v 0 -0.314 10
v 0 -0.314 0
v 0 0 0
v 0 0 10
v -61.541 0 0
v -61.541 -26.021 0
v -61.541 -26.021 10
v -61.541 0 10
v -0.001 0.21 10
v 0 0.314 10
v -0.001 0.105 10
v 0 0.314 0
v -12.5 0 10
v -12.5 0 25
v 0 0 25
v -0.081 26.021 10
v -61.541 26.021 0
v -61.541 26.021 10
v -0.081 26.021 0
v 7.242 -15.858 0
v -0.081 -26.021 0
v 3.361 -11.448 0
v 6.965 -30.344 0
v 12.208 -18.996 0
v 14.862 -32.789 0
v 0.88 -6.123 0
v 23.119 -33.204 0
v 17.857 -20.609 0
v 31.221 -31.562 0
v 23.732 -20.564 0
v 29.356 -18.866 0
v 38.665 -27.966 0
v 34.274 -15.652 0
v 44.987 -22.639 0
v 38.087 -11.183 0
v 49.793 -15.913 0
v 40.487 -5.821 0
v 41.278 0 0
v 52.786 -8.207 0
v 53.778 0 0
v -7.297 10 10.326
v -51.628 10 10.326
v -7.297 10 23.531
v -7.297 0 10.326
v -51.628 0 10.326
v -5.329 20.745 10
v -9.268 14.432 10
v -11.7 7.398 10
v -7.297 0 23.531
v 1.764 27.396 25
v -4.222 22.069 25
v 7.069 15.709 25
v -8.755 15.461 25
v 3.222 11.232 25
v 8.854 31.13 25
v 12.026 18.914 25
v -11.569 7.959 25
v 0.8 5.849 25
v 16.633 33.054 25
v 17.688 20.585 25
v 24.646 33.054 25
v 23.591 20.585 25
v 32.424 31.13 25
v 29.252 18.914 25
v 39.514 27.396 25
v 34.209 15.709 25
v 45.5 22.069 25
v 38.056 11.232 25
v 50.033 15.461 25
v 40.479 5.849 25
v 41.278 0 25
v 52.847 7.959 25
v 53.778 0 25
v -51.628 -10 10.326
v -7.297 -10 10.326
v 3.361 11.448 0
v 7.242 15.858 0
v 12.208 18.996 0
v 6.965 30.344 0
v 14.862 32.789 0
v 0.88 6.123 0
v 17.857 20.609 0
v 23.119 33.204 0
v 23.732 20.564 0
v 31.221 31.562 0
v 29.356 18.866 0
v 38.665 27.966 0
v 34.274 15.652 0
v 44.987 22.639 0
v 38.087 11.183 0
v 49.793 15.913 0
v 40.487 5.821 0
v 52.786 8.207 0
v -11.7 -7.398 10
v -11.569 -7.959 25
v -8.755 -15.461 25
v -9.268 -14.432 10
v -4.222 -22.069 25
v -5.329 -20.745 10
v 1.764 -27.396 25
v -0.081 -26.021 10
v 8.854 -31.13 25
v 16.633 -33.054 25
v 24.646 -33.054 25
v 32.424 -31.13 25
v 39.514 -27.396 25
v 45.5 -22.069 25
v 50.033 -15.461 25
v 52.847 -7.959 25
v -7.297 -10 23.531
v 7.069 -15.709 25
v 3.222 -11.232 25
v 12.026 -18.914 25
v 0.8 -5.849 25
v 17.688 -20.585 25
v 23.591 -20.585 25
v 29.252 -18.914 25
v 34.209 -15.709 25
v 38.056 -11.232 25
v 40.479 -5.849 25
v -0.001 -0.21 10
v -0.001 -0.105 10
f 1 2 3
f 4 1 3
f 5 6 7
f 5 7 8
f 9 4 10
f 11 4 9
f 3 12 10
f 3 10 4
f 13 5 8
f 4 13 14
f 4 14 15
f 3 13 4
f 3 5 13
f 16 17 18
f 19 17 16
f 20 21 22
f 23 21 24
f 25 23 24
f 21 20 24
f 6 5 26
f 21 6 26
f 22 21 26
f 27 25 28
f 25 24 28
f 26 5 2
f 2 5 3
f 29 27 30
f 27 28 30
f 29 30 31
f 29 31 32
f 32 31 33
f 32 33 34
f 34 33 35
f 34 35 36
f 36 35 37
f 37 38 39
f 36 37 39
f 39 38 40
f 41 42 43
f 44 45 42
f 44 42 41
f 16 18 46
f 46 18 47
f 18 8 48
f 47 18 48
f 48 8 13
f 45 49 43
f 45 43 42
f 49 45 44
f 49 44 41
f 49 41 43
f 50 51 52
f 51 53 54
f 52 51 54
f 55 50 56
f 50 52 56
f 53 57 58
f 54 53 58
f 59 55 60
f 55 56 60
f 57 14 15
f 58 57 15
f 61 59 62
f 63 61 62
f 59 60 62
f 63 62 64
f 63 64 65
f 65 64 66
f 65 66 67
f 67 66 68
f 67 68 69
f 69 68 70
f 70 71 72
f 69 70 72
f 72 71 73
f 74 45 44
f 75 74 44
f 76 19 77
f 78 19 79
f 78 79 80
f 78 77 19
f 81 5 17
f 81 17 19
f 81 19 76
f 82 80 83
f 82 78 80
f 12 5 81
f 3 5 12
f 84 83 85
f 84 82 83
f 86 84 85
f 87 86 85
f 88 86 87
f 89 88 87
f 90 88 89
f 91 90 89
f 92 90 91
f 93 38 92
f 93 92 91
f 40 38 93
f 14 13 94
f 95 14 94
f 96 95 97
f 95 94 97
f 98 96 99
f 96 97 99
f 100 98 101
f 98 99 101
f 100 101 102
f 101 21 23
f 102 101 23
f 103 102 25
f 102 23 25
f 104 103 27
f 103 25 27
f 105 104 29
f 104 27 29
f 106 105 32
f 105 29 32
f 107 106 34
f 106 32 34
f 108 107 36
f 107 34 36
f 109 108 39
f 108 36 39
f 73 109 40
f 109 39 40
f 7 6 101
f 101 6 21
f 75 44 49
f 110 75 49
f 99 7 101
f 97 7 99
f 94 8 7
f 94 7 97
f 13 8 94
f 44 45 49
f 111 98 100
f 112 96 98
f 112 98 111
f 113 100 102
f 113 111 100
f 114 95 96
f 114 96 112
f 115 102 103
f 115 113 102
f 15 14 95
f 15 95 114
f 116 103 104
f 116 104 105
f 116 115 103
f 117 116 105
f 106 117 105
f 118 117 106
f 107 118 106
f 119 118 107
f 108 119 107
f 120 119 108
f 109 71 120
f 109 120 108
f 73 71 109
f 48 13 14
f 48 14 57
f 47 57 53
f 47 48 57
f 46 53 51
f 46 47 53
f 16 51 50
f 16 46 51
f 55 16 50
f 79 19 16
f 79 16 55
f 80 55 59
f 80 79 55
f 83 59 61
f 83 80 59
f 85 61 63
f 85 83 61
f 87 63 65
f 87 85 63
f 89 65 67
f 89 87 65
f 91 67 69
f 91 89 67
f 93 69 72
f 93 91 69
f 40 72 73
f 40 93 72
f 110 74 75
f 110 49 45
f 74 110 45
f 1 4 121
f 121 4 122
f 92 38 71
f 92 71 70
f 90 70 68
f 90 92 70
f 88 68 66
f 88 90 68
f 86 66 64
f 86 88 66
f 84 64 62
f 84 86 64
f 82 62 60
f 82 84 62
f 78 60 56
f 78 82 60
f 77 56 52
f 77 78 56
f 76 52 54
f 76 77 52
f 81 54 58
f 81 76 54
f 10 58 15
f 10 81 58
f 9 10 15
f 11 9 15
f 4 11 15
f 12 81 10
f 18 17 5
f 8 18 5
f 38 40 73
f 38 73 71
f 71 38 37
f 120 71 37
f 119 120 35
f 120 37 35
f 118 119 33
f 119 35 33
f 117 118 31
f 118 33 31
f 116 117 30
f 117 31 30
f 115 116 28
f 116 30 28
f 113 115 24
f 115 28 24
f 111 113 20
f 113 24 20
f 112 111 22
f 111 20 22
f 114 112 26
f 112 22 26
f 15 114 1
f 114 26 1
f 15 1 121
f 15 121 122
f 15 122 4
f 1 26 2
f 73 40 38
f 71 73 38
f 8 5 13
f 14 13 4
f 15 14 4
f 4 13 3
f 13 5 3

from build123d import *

# Parameters (mm, degrees)
F1_DEPTH = 25
F2_W     = 61.540648
F2_H     = 26.020542
F3_DEPTH = 10
F5_DEPTH = 10


with BuildPart() as f1:
    # F0 (on Top) → F1 (new body)
    with BuildSketch(Plane.XY):
        with BuildLine():
            Line((0, 0), (-12.5, 0))
            ThreePointArc((-12.5, 0), (20.639135, -33.29669), (53.77827, 0))
            Line((53.77827, 0), (41.27827, 0))
            ThreePointArc((41.27827, 0), (20.639135, -20.796916), (0, 0))
        make_face()
    extrude(amount=F1_DEPTH)

    # F2 (on Top) → F3 (join)
    with BuildSketch(Plane.XY):
        with Locations((-30.770324, -13.010271)):
            Rectangle(F2_W, F2_H)
    extrude(amount=F3_DEPTH)


with BuildPart() as f5:
    # F4 (on Front) → F5 (new body)
    with BuildSketch(Plane.XZ):
        Polygon((-51.628061, 10.325613), (-7.296763, 10.325613), (-7.296763, 23.530681), align=None)
    extrude(amount=F5_DEPTH)


with BuildPart() as f6_1:
    # F6: instance of F1
    add(f1.part.mirror(Plane.XZ))


with BuildPart() as f6_2:
    # F6: instance of F5
    add(f5.part.mirror(Plane.XZ))


solid = Compound([f1.part, f5.part, f6_1.part, f6_2.part])
